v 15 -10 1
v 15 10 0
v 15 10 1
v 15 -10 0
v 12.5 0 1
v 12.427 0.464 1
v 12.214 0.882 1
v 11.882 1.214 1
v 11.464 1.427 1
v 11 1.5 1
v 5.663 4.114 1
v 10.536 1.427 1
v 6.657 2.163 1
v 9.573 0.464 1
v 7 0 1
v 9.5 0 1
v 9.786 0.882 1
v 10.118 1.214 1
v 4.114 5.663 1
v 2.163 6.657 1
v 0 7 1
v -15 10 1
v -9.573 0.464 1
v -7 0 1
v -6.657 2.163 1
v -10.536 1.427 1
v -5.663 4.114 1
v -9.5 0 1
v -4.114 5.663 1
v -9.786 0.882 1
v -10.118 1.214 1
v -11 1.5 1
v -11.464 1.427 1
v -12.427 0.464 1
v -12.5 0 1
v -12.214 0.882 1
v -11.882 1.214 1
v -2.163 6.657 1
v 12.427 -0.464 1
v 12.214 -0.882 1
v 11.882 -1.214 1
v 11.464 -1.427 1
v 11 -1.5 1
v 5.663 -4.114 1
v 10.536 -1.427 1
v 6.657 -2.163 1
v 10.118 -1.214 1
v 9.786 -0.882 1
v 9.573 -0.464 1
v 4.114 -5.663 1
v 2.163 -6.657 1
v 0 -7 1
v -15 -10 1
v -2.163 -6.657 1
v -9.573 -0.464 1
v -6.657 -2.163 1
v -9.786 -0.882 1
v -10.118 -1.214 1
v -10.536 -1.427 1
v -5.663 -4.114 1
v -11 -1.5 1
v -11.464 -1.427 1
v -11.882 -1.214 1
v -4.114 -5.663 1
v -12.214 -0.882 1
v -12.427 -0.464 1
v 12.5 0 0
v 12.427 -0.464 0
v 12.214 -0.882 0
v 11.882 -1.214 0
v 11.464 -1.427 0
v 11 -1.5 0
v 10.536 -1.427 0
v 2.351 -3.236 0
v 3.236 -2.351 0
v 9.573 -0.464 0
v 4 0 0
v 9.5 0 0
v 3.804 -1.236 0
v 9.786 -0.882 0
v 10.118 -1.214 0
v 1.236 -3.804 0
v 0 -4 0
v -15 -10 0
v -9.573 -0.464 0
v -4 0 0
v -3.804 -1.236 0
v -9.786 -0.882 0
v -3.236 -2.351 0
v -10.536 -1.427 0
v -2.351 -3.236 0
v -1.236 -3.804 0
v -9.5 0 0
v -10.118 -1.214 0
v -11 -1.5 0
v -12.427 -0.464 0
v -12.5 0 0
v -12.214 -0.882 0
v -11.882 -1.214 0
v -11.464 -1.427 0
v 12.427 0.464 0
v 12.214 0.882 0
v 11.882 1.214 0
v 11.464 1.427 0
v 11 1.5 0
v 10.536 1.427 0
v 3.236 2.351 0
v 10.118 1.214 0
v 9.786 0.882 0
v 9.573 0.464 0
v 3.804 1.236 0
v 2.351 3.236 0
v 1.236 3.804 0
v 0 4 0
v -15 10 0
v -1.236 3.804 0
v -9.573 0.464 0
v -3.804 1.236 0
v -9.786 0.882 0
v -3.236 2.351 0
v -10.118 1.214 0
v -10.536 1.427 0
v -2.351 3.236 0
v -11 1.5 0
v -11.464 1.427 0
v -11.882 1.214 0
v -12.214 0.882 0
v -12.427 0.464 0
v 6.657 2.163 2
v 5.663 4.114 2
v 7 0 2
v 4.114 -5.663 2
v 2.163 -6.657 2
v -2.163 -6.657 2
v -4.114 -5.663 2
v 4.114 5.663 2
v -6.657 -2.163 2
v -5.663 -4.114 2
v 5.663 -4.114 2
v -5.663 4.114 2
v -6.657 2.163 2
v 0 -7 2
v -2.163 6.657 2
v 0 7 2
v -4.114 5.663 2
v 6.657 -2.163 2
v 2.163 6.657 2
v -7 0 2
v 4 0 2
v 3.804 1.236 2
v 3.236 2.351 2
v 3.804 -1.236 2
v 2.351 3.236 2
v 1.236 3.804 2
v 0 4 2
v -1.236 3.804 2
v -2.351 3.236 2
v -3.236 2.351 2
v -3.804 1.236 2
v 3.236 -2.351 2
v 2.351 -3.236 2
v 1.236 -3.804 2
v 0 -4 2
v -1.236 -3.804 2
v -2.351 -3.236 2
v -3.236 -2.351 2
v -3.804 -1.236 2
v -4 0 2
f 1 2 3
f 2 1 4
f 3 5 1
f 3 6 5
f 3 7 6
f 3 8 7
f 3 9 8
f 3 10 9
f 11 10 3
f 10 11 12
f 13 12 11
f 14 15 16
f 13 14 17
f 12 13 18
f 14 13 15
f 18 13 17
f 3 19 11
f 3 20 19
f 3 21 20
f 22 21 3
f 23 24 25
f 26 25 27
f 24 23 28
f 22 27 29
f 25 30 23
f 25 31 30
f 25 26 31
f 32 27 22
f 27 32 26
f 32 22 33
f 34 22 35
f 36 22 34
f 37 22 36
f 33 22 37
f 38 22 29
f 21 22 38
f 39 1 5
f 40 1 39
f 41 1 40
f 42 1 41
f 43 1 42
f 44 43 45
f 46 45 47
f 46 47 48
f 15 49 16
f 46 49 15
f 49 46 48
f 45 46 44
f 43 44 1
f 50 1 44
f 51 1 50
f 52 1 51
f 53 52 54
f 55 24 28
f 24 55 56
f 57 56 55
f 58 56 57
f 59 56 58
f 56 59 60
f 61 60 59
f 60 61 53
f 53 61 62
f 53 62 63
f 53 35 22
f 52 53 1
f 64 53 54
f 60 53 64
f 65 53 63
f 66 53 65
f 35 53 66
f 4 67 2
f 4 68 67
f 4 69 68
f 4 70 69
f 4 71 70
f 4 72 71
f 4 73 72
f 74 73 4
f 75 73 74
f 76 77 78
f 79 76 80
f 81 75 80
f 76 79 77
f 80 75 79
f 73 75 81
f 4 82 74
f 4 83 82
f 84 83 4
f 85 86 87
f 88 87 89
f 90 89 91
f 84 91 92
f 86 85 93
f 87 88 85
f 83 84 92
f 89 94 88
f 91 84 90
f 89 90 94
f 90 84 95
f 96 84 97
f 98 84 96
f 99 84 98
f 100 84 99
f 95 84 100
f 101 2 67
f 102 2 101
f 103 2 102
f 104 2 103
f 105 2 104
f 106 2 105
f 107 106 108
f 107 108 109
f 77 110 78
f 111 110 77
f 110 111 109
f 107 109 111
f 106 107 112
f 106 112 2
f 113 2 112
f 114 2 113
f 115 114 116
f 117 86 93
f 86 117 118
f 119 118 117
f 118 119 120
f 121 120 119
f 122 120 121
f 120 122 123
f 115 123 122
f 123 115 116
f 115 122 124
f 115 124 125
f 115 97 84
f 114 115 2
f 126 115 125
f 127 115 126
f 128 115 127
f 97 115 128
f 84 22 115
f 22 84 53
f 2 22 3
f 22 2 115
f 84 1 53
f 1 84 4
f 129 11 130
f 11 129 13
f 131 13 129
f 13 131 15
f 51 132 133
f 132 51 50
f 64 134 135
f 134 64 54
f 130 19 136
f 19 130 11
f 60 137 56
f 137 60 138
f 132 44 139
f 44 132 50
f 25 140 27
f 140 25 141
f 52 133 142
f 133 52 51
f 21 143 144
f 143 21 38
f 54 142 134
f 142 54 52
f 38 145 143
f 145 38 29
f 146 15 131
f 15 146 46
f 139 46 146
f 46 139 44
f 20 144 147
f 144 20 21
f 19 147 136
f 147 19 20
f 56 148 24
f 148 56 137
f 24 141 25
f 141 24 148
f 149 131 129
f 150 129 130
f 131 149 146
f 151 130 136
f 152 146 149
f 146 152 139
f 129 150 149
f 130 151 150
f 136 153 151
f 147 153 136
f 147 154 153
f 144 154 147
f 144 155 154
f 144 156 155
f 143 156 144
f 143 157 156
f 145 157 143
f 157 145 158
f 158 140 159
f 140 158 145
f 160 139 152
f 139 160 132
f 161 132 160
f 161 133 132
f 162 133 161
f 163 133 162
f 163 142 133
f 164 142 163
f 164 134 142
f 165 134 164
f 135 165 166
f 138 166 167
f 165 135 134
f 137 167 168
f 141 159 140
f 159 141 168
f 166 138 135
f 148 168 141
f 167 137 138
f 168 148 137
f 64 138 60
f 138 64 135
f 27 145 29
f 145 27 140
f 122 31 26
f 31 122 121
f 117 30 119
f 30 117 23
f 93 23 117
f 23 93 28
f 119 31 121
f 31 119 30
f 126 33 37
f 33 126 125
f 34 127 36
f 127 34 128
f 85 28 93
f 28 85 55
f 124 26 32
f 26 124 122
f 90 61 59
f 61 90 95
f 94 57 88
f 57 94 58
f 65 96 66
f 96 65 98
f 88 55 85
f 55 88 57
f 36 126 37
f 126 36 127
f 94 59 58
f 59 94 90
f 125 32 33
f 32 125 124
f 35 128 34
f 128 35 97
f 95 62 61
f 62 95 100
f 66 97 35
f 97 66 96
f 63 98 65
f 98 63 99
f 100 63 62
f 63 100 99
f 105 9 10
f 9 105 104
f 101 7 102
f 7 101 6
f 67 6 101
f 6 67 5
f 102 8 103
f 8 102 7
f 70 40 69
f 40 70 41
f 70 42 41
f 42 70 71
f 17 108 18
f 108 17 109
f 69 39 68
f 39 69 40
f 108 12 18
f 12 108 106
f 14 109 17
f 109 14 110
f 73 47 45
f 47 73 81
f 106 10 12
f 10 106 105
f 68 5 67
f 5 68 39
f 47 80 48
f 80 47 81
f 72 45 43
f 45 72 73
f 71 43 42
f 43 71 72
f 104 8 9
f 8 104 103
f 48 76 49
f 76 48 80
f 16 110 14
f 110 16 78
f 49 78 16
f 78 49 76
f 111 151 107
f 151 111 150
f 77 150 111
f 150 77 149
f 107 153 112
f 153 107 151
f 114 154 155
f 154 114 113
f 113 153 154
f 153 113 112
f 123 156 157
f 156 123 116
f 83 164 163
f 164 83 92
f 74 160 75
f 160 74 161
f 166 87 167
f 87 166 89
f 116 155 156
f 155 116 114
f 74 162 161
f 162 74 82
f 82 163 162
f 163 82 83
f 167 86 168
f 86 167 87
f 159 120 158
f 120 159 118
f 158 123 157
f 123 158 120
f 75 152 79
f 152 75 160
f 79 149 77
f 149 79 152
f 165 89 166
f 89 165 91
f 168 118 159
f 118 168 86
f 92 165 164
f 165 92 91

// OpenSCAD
$fn = 20;

CHD = 8; /* connector hole diameter */
W1 = 30; /* outer width */
H1 = 20; /* outer height */
T1 = 1; /* outer thickness */
D2 = 14; /* inner diameter */
T2 = 2; /* inner thickness */
SHD = 3; /* screw hole diameter */
SHO = 11; /* screw hole center offset */

difference() {
    translate([-W1/2,-H1/2]) union() {
        /* outer plate: */
        cube([W1,H1,T1]);
        /* inner plate: */
        translate([W1/2,H1/2]) cylinder(d=D2, h=T2);
    }
    /* connector hole: */
    cylinder(d=CHD, h=T2);
    /* screw holes: */
    for (i = [-1,1]) {
        translate([i*SHO,0]) cylinder(d=SHD, h=T2);
    }
}
